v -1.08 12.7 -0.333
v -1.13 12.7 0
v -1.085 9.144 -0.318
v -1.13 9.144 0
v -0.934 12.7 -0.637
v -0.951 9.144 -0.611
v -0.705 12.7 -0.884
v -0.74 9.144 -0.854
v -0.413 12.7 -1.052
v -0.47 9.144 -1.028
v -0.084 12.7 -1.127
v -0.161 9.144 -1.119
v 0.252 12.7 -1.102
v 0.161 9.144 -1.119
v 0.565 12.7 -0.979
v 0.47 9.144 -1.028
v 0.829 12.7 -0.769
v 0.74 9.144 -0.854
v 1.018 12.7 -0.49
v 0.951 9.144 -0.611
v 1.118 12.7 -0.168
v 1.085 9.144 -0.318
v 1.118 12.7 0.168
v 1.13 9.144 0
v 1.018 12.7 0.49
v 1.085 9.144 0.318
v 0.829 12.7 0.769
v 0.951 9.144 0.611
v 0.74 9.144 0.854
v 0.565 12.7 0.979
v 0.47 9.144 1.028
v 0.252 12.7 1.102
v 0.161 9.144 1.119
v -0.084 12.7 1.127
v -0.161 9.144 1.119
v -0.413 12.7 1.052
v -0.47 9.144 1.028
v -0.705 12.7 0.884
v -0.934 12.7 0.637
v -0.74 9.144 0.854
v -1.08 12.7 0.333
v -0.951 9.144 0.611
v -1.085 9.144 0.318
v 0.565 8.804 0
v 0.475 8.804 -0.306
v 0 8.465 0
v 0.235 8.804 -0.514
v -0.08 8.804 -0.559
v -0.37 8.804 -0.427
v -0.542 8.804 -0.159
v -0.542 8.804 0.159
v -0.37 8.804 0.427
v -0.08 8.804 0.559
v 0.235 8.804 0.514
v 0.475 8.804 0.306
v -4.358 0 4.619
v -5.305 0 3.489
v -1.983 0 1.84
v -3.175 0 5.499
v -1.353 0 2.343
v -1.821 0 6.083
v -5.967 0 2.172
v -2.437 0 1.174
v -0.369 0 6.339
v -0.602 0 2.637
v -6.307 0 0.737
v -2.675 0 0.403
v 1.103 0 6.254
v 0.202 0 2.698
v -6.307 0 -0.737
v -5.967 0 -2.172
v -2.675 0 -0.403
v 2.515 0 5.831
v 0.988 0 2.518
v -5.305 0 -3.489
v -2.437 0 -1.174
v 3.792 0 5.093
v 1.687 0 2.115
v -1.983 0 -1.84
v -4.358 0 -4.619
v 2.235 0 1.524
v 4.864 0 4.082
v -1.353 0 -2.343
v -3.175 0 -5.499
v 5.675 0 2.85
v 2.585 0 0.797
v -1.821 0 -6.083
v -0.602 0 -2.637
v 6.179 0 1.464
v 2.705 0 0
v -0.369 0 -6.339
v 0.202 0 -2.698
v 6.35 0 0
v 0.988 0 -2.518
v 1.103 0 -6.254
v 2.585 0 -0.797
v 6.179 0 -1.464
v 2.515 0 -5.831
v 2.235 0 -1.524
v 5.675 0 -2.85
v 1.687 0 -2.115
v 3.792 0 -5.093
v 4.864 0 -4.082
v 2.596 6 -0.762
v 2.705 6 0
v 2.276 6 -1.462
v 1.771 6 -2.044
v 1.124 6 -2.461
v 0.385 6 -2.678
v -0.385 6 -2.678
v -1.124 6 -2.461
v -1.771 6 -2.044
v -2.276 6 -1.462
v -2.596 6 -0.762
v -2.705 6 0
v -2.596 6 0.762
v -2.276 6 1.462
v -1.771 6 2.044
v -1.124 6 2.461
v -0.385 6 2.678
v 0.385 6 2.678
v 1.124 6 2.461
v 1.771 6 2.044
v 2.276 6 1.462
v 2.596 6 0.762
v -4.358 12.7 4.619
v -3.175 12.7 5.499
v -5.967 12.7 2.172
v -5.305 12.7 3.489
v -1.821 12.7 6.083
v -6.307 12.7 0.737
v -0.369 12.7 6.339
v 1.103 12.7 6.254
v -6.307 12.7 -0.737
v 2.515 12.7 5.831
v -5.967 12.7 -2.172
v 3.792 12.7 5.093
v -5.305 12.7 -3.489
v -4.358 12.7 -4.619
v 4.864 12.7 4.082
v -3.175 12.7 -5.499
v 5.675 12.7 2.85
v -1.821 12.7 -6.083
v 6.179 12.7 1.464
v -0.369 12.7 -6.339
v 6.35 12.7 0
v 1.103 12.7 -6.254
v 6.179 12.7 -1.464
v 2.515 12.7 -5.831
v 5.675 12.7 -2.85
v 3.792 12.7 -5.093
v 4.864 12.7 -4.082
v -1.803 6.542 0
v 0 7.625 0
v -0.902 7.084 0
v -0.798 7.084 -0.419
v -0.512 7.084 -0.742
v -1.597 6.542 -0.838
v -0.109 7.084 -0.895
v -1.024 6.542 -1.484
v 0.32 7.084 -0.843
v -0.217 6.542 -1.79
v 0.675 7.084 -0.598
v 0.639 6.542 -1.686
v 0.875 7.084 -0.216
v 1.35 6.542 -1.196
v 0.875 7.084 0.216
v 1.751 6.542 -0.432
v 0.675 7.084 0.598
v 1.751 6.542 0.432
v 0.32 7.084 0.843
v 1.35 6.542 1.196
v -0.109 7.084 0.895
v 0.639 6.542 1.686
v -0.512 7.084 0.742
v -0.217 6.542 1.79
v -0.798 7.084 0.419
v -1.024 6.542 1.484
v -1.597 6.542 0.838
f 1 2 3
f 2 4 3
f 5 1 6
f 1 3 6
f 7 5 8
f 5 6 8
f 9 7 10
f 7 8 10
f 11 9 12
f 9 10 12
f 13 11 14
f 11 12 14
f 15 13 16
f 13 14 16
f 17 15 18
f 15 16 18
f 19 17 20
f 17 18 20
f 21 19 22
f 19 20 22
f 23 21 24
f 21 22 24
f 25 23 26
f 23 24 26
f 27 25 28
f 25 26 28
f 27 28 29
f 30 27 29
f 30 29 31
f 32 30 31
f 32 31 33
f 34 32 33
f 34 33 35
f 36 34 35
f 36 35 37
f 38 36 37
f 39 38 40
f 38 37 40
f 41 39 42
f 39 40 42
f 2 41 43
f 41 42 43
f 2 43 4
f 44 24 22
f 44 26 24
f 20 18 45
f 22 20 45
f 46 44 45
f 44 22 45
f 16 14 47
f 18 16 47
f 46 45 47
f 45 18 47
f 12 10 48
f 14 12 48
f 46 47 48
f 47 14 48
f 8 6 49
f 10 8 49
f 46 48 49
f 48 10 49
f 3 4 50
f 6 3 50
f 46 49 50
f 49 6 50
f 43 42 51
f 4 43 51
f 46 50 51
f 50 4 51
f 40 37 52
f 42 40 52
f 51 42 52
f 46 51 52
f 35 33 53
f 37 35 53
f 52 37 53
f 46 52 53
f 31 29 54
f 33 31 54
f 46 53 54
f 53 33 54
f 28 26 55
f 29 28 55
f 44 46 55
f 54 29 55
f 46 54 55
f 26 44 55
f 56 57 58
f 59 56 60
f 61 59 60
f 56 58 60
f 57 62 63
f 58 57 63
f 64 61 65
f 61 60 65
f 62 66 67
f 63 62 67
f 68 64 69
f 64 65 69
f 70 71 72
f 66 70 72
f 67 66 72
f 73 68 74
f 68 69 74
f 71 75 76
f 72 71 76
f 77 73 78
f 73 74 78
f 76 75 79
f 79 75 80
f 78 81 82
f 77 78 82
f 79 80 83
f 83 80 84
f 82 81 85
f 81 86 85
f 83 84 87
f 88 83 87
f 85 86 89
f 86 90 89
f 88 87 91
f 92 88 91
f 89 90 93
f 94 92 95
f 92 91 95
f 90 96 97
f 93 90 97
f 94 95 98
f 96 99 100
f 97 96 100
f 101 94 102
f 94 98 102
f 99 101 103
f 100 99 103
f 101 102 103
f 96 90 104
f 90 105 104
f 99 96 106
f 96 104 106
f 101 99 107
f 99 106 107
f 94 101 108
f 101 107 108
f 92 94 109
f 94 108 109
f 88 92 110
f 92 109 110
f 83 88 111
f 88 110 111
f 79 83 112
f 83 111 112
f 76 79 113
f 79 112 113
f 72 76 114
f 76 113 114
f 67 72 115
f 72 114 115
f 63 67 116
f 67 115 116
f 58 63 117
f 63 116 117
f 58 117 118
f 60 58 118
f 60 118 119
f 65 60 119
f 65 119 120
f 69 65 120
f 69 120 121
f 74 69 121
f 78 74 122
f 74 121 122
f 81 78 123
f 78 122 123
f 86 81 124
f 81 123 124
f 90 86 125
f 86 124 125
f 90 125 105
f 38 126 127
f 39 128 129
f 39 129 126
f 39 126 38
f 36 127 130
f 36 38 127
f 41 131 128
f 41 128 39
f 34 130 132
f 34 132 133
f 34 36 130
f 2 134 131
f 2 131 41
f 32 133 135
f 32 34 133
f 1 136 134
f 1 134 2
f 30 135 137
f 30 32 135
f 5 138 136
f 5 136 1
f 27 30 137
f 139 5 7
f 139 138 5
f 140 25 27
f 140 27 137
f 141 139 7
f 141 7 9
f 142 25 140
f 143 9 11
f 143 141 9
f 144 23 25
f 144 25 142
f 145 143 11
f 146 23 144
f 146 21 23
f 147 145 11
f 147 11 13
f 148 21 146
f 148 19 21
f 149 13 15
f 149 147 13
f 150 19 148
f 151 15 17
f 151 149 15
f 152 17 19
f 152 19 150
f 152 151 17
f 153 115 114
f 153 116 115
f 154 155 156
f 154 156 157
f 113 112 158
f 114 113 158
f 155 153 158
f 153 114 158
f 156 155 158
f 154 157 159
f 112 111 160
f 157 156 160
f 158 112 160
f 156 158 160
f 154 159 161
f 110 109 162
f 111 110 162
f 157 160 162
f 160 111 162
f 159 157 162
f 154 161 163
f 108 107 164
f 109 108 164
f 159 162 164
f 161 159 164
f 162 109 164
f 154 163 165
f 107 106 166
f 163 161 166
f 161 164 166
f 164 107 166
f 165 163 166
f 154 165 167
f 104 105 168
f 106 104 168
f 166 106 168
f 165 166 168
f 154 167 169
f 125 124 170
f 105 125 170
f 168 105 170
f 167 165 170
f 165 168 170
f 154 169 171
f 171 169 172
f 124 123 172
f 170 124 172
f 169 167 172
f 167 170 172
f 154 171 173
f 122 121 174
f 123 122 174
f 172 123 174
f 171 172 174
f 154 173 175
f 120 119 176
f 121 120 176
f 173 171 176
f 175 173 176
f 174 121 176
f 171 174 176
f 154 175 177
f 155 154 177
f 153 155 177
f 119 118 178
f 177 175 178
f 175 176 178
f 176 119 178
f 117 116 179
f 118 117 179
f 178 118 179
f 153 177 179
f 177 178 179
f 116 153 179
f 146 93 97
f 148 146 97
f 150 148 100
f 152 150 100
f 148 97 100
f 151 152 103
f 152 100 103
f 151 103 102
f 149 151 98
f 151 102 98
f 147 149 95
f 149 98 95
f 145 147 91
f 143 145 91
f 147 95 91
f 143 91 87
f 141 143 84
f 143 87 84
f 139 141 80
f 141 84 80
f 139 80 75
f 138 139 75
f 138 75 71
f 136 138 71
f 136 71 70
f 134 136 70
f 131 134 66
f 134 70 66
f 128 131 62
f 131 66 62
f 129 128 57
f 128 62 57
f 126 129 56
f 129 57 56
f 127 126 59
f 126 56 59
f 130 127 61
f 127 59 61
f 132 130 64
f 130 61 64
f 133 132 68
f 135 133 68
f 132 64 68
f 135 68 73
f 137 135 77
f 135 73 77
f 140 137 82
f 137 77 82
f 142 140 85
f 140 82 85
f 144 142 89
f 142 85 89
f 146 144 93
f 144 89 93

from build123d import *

# Parameters (mm, degrees)
SKETCH1_R                   = 6.35
BOSS_EXTRUDE1_DEPTH         = 12.7
F_4_40_TAPPED_HOLE1_D       = 2.2606
F_4_40_TAPPED_HOLE1_DEPTH   = 3.556
F_4_40_TAPPED_HOLE1_TIP     = 0.679152758
F_1_4_28_TAPPED_HOLE1_D     = 5.4102
F_1_4_28_TAPPED_HOLE1_DEPTH = 6
F_1_4_28_TAPPED_HOLE1_TIP   = 1.625388061


with BuildPart() as part:
    # Sketch1 → Boss-Extrude1 (new body)
    with BuildSketch(Plane(origin=(0, 0, 0), x_dir=(1, 0, 0), z_dir=(0, 1, 0))):
        Circle(SKETCH1_R)
    extrude(amount=BOSS_EXTRUDE1_DEPTH)

    # #4-40 Tapped Hole1
    with Locations(Plane(origin=(0, 12.7, 0), x_dir=(1, 0, 0), z_dir=(0, 1, 0))):
        with Locations((0, 0)):
            Hole(F_4_40_TAPPED_HOLE1_D / 2, depth=F_4_40_TAPPED_HOLE1_DEPTH)
            with Locations((0, 0, -(F_4_40_TAPPED_HOLE1_DEPTH + F_4_40_TAPPED_HOLE1_TIP / 2))):  # 118° drill point
                Cone(0, F_4_40_TAPPED_HOLE1_D / 2, F_4_40_TAPPED_HOLE1_TIP, mode=Mode.SUBTRACT)

    # 1/4-28 Tapped Hole1
    with Locations(Plane(origin=(0, 0, 0), x_dir=(-1, 0, 0), z_dir=(0, -1, 0))):
        with Locations((0, 0)):
            Hole(F_1_4_28_TAPPED_HOLE1_D / 2, depth=F_1_4_28_TAPPED_HOLE1_DEPTH)
            with Locations((0, 0, -(F_1_4_28_TAPPED_HOLE1_DEPTH + F_1_4_28_TAPPED_HOLE1_TIP / 2))):  # 118° drill point
                Cone(0, F_1_4_28_TAPPED_HOLE1_D / 2, F_1_4_28_TAPPED_HOLE1_TIP, mode=Mode.SUBTRACT)


solid = part.part
